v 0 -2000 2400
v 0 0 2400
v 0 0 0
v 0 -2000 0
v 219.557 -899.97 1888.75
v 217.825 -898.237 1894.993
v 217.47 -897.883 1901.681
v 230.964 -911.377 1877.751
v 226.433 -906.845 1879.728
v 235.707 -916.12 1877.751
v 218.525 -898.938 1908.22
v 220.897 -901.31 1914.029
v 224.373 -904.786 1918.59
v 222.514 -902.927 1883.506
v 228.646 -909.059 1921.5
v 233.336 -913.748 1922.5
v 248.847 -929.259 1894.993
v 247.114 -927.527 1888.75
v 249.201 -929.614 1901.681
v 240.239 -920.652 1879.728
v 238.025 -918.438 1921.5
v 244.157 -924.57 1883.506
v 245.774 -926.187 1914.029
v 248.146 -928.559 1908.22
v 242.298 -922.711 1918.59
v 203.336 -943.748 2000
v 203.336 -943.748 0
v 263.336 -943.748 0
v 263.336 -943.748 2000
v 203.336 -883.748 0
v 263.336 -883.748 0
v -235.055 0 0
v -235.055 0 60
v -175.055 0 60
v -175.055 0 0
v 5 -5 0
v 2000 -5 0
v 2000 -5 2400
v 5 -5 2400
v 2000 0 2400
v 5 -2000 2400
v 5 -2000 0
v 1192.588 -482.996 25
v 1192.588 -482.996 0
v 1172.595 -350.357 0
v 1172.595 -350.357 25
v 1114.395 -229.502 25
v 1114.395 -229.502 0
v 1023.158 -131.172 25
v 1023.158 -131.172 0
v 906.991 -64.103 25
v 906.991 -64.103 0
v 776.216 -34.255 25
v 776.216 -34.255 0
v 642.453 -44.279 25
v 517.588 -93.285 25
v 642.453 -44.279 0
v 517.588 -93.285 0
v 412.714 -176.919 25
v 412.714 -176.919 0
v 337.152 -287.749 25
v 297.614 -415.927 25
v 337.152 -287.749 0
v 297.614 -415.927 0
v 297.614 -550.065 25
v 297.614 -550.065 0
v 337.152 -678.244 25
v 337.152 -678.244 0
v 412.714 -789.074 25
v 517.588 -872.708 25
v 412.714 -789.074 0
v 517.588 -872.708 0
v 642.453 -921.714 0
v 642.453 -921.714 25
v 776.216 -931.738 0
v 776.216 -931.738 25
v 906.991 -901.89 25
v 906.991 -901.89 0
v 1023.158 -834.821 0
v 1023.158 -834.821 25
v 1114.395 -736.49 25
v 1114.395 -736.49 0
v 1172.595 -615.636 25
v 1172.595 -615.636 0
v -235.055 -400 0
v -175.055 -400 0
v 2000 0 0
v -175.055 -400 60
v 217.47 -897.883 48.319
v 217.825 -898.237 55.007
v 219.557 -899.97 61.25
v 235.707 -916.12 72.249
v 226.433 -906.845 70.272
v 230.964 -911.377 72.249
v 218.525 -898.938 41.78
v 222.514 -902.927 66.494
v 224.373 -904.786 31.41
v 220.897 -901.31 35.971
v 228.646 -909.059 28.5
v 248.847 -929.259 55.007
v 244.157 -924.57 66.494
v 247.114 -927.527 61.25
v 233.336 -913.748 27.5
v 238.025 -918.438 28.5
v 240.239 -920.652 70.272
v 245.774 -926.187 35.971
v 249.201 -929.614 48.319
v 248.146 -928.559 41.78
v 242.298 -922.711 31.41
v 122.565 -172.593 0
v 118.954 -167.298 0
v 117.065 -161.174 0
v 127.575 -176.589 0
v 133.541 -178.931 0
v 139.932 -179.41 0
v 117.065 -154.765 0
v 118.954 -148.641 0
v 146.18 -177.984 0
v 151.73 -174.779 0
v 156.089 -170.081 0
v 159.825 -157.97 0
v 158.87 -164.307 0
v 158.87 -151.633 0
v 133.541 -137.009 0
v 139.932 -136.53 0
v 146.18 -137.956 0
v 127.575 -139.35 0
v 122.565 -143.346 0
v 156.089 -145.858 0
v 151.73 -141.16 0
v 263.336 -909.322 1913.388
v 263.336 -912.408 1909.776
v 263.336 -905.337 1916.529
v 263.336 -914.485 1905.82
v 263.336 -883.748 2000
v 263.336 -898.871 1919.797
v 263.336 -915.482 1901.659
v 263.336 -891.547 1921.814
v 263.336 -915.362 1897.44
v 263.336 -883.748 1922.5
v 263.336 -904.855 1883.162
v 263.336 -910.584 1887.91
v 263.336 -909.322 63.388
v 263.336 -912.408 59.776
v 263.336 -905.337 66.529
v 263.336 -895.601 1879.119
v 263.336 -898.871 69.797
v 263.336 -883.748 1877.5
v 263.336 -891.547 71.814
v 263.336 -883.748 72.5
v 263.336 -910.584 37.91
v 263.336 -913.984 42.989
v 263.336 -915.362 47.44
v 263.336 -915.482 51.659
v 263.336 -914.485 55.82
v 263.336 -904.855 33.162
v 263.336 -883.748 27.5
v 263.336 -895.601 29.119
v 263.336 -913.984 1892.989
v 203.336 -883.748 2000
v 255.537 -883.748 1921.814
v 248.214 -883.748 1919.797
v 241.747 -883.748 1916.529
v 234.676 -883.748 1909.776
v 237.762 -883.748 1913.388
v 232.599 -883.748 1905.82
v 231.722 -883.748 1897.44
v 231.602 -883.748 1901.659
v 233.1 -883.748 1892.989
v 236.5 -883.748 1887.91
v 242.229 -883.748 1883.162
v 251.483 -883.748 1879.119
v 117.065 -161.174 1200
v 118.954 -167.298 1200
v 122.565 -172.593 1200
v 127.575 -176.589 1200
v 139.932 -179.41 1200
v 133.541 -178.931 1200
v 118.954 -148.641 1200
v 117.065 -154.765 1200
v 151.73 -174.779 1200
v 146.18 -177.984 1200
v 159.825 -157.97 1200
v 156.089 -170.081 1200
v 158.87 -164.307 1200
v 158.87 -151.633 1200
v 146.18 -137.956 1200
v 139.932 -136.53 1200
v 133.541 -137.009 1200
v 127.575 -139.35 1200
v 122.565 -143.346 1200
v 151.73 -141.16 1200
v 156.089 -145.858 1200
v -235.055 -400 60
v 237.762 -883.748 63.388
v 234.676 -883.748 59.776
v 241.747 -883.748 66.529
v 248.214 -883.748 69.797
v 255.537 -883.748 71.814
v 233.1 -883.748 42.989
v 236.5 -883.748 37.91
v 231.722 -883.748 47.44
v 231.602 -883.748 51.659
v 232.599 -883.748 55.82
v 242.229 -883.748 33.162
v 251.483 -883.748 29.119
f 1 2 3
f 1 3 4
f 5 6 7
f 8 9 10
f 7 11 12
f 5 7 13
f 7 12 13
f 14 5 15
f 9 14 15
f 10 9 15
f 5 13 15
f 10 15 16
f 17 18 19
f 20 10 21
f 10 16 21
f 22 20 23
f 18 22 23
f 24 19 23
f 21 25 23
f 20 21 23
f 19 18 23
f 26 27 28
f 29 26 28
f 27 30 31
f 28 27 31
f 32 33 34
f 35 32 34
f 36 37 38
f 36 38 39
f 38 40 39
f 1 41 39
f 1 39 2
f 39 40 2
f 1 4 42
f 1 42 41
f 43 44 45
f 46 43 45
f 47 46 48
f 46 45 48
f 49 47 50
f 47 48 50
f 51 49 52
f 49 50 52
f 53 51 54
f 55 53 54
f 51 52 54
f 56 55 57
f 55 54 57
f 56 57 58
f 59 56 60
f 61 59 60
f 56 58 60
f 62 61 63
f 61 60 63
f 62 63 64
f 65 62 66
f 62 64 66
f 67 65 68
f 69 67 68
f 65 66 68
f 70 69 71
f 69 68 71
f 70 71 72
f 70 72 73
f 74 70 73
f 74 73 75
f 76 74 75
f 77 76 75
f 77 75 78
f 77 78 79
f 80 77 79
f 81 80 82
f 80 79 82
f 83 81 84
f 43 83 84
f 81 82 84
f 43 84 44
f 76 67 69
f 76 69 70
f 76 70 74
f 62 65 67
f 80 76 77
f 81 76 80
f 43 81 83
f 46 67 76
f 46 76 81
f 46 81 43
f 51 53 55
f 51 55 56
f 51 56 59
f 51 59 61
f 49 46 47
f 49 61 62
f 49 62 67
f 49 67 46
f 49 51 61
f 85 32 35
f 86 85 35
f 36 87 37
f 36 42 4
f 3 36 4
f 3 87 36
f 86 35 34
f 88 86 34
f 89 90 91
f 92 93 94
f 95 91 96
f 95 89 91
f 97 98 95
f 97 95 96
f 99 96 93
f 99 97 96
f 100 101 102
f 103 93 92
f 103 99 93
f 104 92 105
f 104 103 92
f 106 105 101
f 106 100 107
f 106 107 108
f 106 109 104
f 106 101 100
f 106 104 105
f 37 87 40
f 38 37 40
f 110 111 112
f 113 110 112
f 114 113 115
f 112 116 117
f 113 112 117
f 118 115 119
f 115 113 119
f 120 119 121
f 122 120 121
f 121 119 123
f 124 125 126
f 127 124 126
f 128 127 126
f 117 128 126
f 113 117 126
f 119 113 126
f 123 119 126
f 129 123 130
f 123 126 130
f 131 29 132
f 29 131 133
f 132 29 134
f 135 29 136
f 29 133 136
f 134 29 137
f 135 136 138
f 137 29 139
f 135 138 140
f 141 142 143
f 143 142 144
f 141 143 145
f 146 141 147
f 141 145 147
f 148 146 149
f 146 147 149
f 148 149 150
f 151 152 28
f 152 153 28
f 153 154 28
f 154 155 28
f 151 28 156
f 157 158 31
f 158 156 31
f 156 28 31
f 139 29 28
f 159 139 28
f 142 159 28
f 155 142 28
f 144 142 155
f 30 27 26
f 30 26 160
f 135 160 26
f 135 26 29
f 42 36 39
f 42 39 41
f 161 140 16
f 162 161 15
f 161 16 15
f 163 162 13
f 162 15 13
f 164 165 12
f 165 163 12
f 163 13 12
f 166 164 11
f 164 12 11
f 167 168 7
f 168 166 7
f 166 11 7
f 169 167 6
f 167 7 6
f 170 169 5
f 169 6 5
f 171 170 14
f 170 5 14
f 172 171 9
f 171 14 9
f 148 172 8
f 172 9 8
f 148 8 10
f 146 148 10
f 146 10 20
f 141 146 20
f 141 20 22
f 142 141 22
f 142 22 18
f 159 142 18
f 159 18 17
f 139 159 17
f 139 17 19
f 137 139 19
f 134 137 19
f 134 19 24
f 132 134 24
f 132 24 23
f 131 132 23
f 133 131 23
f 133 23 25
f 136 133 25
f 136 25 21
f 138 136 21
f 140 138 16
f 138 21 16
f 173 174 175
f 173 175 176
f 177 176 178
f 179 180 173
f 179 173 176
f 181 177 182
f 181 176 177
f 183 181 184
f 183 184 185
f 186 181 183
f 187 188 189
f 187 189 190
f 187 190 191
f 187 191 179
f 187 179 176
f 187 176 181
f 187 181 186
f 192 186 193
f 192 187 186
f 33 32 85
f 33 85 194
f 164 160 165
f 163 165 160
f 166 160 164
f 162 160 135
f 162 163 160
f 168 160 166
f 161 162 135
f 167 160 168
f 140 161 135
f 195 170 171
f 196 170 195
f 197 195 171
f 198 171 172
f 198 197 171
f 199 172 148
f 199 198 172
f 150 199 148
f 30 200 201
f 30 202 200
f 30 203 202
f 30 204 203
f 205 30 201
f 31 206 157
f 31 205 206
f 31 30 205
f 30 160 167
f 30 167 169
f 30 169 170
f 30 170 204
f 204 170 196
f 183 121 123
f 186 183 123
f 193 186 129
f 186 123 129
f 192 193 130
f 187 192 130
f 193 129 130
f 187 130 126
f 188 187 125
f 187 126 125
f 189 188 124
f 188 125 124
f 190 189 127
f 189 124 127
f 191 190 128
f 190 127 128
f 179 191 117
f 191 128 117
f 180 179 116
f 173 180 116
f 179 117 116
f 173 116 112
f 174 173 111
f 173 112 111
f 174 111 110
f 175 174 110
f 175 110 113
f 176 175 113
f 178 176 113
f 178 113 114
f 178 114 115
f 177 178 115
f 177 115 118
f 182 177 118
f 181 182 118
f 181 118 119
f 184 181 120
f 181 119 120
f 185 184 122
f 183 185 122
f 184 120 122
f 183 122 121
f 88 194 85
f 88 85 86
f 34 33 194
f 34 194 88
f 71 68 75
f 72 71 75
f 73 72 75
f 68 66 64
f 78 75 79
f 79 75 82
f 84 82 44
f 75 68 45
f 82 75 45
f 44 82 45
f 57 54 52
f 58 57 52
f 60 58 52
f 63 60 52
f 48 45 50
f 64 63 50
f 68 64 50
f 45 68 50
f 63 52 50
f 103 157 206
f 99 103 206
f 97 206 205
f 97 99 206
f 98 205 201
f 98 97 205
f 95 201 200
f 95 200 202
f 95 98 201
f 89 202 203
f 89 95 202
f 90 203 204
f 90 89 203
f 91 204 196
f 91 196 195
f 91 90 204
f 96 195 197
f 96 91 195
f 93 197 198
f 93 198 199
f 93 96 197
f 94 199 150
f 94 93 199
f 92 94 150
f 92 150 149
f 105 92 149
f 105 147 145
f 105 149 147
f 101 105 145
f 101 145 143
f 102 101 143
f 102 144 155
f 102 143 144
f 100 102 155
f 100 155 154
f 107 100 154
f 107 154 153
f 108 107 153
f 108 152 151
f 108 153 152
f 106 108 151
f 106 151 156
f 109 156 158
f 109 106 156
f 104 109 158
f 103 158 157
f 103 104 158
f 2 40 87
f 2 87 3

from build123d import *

# Parameters (mm, degrees)
F2_W      = 60
F2_H      = 60
F3_DEPTH  = 2000
F1_E1_W   = 2000
F1_E1_H   = 2400
F4_DEPTH  = 5
F1_E0_W   = 2000
F1_E0_H   = 2400
F5_DEPTH  = 5
F6_R      = 21.5
F7_DEPTH  = 1200
F10_DEPTH = 76
F12_R     = 450
F13_DEPTH = 25
F14_W     = 60
F14_H     = 60
F15_DEPTH = 400


# Not quite as in the source:
# - a pattern or mirror of a feature is missing from the dataset's text; its kind, count and spacing are read off the source's solid


with BuildPart() as f3:
    # F2 (on Top) → F3 (new body)
    with BuildSketch(Plane.XY):
        with Locations((233.3355557919, -913.7484741211)):
            Rectangle(F2_W, F2_H)
    extrude(amount=F3_DEPTH)

    # F9 (on face) → F10 (cut)
    with BuildSketch(Plane(origin=(-340.2064591646, -340.2064591646, 0), x_dir=(0.7071067812, -0.7071067812, 0), z_dir=(-0.7071067812, -0.7071067812, 0))):
        with BuildLine():
            ThreePointArc((833.6108961422, 1900), (827.0207987189, 1915.9099025767), (811.1108961422, 1922.5))
            Line((811.1108961422, 1922.5), (811.1108961422, 1877.5))
            ThreePointArc((811.1108961422, 1877.5), (827.0207987189, 1884.0900974233), (833.6108961422, 1900))
        make_face()
        with BuildLine():
            Line((811.1108961422, 1877.5), (811.1108961422, 1922.5))
            ThreePointArc((811.1108961422, 1922.5), (788.6108961422, 1900), (811.1108961422, 1877.5))
        make_face()
    f10 = extrude(amount=-F10_DEPTH, mode=Mode.SUBTRACT)

    # F10_copies: F10 across plane
    add(f10.mirror(Plane(origin=(0, 0, 975), x_dir=(-1, 0, 0), z_dir=(0, 0, -1))), mode=Mode.SUBTRACT)


with BuildPart() as f4:
    # F1_E1 (on explicit) → F4 (new body)
    with BuildSketch(Plane(origin=(0, 0, 0), x_dir=(0, -1, 0), z_dir=(-1, 0, 0))):
        with Locations((1000, 1200)):
            Rectangle(F1_E1_W, F1_E1_H)
    extrude(amount=-F4_DEPTH)

    # F1_E0 (on explicit) → F5 (join)
    with BuildSketch(Plane(origin=(2000, 0, 0), x_dir=(-1, 0, 0), z_dir=(0, 1, 0))):
        with Locations((1000, 1200)):
            Rectangle(F1_E0_W, F1_E0_H)
    extrude(amount=-F5_DEPTH)


with BuildPart() as f7:
    # F6 (on Top) → F7 (new body)
    with BuildSketch(Plane.XY):
        with Locations((138.325303793, -157.9697430134)):
            Circle(F6_R)
    extrude(amount=F7_DEPTH)


with BuildPart() as f13:
    # F12 (on Top) → F13 (new body)
    with BuildSketch(Plane.XY):
        with Locations((742.5876259804, -482.996404171)):
            Circle(F12_R)
    extrude(amount=F13_DEPTH)


with BuildPart() as f15:
    # F14 (on Front) → F15 (new body)
    with BuildSketch(Plane.XZ):
        with Locations((-205.0545227528, 30)):
            Rectangle(F14_W, F14_H)
    extrude(amount=F15_DEPTH)


solid = Compound([f3.part, f4.part, f7.part, f13.part, f15.part])
